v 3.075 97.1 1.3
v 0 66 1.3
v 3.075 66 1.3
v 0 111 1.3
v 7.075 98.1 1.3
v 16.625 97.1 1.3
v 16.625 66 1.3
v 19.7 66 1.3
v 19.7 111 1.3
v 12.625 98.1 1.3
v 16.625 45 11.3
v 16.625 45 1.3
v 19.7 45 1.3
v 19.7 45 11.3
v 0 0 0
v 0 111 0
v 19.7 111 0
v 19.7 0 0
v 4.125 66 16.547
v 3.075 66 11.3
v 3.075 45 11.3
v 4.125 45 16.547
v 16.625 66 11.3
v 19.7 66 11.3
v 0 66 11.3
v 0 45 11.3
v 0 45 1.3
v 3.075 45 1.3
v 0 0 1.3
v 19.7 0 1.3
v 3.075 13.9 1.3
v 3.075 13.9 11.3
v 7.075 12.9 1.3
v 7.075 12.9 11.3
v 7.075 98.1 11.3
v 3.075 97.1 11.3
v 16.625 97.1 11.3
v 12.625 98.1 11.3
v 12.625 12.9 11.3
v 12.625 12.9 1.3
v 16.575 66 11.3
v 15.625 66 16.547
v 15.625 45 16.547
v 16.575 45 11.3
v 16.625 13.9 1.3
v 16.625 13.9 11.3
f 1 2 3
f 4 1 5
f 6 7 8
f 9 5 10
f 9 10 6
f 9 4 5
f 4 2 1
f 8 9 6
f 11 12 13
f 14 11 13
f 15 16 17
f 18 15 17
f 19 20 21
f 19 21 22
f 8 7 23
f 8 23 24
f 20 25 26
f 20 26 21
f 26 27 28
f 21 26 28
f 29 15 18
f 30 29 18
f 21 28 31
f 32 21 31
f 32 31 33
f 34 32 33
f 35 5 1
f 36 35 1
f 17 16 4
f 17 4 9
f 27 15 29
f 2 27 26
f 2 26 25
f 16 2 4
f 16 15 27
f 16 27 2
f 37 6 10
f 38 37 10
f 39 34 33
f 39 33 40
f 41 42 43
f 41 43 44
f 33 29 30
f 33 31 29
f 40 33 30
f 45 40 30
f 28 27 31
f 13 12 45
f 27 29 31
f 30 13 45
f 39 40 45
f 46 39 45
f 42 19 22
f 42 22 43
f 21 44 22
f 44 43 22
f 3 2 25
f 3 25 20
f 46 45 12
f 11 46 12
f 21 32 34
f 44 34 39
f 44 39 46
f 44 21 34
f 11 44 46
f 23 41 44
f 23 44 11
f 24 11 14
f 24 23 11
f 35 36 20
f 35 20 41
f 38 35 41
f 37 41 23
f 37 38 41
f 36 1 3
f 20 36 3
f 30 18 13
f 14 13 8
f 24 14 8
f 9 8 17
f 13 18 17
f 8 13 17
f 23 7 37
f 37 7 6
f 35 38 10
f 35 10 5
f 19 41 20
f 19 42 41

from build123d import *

# Parameters (mm, degrees)
F0_W     = 19.7
F0_H     = 111
F1_DEPTH = 1.3
F3_DEPTH = 10
F4_W     = 19.7
F4_H     = 21
F5_DEPTH = 10
F7_DEPTH = 21


with BuildPart() as f1:
    # F0 (on Top) → F1 (new body)
    with BuildSketch(Plane.XY):
        with Locations((9.85, 55.5)):
            Rectangle(F0_W, F0_H)
    extrude(amount=F1_DEPTH)

    # F2 (on face) → F3 (join)
    with BuildSketch(Plane.XY.offset(1.3)):
        Polygon((12.625, 98.1), (7.075, 98.1), (3.075, 97.1), (3.075, 13.9), (7.075, 12.9), (12.625, 12.9), (16.625, 13.9), (16.625, 97.1), align=None)
    extrude(amount=F3_DEPTH)

    # F4 (on face) → F5 (join)
    with BuildSketch(Plane.XY.offset(1.3)):
        with Locations((9.85, 55.5)):
            Rectangle(F4_W, F4_H)
    extrude(amount=F5_DEPTH)

    # F6 (on face) → F7 (join, through all)
    with BuildSketch(Plane(origin=(0, 66, 0), x_dir=(-1, 0, 0), z_dir=(0, 1, 0))):
        Polygon((-16.575, 11.3), (-3.075, 11.3), (-4.125, 16.5472850204), (-15.625, 16.5472850204), align=None)
    extrude(amount=-F7_DEPTH)


solid = f1.part
